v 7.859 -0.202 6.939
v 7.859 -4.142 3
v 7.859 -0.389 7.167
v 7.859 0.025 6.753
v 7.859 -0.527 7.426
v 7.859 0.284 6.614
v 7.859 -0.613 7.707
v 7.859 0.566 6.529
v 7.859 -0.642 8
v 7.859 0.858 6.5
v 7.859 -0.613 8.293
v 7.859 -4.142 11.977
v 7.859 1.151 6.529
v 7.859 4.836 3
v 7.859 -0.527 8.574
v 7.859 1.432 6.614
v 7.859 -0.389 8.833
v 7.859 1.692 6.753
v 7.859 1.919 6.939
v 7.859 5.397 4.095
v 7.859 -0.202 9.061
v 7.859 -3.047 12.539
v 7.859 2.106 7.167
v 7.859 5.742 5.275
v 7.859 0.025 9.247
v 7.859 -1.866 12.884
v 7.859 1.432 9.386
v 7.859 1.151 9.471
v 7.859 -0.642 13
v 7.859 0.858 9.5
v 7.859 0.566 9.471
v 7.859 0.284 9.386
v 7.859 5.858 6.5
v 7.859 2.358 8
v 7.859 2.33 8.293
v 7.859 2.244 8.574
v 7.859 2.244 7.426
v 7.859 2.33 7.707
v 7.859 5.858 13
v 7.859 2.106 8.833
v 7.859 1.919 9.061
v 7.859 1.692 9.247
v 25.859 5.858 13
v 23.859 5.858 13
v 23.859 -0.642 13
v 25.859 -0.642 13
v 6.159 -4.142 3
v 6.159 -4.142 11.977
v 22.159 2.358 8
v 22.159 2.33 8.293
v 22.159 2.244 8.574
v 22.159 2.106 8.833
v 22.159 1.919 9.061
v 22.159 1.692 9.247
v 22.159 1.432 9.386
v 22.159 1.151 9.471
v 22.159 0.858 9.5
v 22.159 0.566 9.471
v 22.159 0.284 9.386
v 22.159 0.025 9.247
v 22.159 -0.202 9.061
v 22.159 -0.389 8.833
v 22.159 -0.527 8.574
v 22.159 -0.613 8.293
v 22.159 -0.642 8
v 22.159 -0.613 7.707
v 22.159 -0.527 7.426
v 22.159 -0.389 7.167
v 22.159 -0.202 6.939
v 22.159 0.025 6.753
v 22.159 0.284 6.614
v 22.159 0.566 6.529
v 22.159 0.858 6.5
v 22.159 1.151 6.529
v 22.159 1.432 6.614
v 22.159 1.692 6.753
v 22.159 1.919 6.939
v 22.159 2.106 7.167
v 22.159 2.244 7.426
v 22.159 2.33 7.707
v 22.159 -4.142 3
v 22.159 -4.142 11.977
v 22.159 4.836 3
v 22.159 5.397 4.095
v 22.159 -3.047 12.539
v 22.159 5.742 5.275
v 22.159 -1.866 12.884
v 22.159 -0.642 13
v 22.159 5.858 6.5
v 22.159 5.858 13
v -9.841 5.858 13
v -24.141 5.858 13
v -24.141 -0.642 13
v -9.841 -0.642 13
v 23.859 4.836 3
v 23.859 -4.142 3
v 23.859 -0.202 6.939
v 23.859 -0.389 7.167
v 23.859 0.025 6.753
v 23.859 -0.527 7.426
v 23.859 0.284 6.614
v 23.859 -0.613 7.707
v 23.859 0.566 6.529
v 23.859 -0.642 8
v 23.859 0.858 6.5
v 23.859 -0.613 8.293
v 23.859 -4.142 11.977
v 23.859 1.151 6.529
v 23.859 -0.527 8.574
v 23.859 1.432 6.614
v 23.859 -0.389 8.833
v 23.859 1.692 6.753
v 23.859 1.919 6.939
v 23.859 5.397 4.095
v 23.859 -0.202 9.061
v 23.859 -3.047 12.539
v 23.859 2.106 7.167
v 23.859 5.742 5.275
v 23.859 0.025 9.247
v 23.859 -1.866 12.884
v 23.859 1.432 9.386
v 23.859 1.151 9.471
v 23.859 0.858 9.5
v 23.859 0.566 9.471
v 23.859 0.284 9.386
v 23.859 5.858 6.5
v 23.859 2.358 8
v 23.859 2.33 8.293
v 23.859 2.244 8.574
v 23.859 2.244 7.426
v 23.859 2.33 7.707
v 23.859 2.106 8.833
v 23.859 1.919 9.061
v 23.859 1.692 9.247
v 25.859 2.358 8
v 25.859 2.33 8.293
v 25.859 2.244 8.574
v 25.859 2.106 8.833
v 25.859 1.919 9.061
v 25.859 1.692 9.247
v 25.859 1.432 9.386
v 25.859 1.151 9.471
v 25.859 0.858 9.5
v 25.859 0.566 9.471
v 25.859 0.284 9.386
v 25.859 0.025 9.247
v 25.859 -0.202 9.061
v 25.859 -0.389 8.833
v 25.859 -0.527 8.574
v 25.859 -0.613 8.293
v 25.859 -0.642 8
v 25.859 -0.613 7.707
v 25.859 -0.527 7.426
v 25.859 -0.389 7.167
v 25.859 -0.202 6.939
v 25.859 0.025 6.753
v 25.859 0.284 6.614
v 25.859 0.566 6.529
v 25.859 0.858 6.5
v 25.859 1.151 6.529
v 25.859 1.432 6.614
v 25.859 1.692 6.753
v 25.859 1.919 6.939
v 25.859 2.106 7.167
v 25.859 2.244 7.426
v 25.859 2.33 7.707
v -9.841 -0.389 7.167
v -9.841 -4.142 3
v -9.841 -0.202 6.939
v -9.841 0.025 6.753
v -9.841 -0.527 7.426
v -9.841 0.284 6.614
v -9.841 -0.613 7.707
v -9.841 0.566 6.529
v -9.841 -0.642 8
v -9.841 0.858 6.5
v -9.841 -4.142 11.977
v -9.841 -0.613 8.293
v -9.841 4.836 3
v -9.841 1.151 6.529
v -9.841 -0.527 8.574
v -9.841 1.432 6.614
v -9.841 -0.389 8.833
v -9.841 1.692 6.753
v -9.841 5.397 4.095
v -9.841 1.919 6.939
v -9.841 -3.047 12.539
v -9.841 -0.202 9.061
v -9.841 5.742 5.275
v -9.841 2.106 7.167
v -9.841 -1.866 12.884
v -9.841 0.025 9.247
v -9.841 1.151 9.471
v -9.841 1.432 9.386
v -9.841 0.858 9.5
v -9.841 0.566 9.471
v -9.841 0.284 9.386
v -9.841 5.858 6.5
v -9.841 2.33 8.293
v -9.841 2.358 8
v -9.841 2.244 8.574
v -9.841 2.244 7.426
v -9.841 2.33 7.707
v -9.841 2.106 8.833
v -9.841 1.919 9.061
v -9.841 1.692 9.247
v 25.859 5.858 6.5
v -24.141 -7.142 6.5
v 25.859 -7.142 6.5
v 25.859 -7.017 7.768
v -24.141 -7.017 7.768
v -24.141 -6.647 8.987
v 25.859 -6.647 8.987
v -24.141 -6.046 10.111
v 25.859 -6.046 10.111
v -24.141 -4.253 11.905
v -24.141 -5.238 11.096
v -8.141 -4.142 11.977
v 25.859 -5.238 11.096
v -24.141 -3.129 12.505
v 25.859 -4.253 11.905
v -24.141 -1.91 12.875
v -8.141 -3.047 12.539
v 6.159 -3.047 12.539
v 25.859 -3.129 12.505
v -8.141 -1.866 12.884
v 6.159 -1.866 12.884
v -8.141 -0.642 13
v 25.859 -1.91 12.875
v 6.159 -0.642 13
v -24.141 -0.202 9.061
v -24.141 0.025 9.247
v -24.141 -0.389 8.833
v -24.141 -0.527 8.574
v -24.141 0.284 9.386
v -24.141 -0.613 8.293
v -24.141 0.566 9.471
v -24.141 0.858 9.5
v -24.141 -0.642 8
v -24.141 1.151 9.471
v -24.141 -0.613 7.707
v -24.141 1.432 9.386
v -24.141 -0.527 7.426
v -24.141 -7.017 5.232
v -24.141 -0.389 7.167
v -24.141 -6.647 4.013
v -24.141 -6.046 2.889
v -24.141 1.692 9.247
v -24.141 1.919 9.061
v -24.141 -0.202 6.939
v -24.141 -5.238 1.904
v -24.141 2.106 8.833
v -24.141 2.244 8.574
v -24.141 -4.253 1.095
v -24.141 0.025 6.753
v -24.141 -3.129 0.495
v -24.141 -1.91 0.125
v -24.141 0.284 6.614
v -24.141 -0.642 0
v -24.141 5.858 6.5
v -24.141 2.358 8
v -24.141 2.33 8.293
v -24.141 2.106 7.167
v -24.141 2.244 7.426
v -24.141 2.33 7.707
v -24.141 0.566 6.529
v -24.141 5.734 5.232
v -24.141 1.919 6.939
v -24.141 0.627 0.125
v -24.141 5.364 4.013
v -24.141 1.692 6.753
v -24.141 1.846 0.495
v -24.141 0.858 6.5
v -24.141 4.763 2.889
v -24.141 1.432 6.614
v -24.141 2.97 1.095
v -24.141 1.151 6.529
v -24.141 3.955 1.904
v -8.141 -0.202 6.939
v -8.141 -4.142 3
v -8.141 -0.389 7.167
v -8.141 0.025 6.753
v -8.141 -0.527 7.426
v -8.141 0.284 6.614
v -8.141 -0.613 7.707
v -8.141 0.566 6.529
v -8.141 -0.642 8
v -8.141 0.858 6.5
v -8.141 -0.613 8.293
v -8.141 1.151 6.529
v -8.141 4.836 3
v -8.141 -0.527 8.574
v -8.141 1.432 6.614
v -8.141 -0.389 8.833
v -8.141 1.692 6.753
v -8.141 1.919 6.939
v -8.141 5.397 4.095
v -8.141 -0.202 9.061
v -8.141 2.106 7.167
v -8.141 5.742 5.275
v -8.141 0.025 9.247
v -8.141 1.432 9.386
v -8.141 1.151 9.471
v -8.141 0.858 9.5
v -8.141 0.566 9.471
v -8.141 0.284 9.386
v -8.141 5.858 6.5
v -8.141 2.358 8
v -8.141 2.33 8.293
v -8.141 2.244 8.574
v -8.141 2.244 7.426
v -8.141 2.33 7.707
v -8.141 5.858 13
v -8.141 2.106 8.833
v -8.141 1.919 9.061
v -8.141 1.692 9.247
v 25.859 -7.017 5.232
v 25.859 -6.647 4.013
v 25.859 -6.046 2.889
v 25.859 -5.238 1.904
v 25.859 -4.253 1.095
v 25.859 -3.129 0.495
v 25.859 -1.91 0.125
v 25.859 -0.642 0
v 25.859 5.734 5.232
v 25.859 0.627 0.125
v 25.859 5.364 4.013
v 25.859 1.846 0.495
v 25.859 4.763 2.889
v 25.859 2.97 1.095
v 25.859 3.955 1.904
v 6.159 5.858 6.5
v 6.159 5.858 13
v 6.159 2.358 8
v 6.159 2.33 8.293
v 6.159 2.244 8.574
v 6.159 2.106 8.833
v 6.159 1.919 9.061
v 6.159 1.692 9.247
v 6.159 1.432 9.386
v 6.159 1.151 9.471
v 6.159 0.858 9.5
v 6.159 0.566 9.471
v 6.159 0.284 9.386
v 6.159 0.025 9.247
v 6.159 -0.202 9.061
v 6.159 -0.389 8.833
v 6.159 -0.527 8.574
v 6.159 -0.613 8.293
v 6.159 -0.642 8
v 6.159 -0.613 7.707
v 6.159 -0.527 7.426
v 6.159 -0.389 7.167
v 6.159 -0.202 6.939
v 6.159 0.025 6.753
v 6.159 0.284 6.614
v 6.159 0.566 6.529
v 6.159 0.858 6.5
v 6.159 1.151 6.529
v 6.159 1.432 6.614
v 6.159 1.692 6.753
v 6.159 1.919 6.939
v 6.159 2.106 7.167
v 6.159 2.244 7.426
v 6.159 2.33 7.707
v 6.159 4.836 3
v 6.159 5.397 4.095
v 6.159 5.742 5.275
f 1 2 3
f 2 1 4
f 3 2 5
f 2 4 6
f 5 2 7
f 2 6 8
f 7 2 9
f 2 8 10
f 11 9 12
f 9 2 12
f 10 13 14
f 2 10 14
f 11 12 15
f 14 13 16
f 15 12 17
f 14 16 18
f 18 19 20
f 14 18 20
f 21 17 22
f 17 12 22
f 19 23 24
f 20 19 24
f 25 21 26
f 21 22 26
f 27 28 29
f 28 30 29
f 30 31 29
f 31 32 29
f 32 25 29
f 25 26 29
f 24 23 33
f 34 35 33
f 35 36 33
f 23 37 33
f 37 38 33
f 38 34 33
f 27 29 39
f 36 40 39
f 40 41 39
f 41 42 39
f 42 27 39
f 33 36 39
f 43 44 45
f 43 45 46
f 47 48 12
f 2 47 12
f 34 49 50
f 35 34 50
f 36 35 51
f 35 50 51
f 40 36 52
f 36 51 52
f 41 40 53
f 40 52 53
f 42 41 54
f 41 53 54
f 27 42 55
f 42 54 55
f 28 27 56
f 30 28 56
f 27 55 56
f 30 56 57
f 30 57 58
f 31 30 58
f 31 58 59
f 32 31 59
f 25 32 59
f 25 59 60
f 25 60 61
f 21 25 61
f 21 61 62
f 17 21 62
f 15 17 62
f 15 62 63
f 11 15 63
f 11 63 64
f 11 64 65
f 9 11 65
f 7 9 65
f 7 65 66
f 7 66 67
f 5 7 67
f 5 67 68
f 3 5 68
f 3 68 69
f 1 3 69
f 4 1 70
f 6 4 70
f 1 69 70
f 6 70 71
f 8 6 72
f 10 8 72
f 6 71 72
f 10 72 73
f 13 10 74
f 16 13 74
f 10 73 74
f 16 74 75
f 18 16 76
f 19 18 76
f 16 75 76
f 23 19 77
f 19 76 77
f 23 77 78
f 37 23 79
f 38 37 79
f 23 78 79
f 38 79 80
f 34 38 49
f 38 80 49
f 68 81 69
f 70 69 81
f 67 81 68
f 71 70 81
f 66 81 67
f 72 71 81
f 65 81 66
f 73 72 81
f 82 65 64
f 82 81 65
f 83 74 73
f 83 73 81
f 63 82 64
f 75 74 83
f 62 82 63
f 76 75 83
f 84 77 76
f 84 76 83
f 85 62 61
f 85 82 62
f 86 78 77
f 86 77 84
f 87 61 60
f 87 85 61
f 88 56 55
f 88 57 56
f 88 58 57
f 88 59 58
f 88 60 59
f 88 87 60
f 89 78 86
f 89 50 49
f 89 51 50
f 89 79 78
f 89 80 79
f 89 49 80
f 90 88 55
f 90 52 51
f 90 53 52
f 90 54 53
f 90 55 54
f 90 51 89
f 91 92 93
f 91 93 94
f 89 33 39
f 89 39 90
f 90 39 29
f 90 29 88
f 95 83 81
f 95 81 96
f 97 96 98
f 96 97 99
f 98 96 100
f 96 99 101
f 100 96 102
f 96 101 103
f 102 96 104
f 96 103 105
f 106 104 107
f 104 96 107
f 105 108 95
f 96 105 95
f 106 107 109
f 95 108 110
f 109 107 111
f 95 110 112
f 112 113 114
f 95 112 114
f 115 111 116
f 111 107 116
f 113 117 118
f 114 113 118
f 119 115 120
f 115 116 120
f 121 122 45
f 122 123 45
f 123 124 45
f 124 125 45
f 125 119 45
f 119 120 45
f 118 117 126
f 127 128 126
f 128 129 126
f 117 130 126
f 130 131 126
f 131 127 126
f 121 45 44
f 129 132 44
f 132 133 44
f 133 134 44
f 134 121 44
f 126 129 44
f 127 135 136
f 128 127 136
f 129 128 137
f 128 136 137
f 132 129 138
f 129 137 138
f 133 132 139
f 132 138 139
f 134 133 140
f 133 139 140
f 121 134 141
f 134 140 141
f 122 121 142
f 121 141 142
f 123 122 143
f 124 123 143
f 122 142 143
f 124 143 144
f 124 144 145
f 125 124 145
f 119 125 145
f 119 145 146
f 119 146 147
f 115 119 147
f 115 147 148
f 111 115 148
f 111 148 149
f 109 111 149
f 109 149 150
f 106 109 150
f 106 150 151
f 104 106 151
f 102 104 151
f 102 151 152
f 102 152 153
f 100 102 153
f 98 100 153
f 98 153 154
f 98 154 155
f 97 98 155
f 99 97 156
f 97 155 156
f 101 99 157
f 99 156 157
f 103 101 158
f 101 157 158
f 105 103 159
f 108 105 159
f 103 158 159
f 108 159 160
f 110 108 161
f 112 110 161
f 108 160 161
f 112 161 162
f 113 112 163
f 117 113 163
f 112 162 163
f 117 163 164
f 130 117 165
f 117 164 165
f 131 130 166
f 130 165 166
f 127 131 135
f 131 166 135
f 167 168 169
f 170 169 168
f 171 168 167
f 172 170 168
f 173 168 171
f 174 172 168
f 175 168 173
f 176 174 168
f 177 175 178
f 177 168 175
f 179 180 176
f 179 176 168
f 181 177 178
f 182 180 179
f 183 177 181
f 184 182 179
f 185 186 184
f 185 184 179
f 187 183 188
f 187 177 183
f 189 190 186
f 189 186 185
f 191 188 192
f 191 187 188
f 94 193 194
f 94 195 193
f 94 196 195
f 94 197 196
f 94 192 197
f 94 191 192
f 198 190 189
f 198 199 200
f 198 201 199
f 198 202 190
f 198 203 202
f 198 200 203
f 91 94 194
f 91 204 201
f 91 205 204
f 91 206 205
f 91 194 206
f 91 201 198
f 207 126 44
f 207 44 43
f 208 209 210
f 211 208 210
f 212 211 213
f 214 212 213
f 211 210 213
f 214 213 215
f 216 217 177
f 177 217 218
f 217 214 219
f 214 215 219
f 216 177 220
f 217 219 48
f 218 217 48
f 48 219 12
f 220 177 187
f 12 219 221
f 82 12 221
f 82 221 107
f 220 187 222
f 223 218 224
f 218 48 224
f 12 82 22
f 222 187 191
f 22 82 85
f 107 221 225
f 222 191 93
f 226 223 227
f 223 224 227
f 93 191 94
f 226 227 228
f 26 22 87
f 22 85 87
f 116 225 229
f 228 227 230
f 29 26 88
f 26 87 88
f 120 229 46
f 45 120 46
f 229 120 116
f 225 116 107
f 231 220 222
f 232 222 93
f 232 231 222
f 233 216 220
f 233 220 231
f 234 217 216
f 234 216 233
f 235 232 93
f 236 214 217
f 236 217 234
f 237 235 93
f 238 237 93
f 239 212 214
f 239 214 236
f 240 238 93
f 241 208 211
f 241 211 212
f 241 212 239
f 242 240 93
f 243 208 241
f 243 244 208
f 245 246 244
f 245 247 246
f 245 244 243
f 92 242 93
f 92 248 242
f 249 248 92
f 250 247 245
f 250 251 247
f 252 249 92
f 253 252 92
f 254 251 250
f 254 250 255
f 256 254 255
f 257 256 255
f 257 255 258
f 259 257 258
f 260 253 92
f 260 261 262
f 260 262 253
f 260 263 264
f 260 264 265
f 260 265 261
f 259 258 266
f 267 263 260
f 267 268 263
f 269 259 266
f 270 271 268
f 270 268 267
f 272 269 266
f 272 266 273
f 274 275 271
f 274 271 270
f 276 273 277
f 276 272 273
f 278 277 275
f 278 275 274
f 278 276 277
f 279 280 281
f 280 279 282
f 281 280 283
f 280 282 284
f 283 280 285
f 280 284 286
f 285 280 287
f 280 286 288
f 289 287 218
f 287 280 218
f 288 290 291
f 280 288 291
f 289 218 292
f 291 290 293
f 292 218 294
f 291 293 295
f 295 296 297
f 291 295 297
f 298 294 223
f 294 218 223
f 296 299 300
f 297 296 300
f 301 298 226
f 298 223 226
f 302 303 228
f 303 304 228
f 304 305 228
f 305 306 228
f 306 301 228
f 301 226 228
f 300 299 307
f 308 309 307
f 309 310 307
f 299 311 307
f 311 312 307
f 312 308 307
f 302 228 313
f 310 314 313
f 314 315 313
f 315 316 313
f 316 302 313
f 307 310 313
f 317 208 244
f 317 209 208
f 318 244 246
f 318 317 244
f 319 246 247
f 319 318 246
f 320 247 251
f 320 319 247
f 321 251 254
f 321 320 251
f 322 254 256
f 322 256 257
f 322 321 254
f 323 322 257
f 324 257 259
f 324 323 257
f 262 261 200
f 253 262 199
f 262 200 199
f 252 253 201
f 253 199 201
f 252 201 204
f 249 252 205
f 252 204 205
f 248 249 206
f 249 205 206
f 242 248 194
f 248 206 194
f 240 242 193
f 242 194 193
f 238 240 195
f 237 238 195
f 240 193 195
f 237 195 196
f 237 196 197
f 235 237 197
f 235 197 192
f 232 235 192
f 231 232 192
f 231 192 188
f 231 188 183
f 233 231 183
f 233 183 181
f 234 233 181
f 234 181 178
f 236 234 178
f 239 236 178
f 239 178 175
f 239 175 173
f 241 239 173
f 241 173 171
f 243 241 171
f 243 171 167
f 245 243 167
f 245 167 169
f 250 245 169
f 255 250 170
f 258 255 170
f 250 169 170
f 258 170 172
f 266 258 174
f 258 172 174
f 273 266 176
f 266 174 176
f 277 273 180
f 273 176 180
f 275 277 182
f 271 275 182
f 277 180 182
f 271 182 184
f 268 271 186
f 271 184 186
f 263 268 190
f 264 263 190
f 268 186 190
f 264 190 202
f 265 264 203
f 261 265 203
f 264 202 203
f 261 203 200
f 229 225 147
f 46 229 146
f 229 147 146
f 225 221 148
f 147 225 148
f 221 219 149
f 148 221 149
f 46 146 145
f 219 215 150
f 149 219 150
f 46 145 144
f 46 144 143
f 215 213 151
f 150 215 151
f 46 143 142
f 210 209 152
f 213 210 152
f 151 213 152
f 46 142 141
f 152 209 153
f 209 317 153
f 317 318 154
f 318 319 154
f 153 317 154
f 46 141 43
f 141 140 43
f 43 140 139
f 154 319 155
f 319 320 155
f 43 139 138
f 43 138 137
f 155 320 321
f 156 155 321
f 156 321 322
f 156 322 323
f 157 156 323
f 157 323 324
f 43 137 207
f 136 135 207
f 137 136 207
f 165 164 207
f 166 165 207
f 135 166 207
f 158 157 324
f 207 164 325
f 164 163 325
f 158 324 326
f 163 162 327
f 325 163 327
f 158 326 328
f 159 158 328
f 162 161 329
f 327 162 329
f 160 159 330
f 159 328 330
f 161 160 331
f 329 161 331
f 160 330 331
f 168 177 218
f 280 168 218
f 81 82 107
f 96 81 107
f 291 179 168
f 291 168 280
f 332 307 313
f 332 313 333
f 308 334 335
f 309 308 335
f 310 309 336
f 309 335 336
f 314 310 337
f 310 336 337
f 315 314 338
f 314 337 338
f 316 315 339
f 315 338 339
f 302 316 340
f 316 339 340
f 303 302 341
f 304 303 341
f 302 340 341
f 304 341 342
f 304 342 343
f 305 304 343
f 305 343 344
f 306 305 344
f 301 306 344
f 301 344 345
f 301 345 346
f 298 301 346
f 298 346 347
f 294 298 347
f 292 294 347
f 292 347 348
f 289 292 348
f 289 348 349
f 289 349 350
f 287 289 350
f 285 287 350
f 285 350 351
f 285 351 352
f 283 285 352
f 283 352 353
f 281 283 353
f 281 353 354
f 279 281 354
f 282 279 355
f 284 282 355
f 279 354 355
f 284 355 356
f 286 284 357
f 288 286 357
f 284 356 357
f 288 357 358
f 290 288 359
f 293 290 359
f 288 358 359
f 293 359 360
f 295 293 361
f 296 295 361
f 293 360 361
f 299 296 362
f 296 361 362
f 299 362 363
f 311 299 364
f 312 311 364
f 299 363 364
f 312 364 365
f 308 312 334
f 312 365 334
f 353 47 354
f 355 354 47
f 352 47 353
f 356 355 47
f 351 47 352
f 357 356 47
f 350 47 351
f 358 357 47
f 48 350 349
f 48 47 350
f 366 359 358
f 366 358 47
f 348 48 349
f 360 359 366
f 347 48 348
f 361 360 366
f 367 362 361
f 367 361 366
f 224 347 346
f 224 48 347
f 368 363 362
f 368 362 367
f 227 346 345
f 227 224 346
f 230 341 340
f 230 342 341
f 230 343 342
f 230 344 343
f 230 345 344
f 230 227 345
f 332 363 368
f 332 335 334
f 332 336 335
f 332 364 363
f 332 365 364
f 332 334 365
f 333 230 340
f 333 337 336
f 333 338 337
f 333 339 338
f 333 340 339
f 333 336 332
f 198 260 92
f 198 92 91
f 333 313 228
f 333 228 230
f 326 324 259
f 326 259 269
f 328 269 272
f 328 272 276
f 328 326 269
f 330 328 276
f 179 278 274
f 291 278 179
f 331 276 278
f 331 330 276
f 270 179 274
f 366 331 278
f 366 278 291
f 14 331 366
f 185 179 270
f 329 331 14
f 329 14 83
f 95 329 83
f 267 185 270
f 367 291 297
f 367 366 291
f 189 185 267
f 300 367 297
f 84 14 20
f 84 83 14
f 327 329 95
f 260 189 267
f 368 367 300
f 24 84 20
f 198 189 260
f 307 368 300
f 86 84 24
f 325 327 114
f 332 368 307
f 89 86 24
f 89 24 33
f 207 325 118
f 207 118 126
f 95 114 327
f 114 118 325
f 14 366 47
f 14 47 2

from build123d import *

# Parameters (mm, degrees)
F0_W     = 50
F0_H     = 13
F1_DEPTH = 13
F2_R     = 1.5
F3_DEPTH = 50.001
F4_R     = 6.49999
F5_W     = 1.7
F5_H     = 10
F6_DEPTH = 10


# Not quite as in the source:
# - a fillet or chamfer is up to 0.001 mm smaller than in the source, because OpenCascade refuses the exact size
# - a feature names something its author has since deleted; it is built from what else it names


with BuildPart() as f1:
    # F0 (on Top) → F1 (new body)
    with BuildSketch(Plane.XY):
        with Locations((0.8589621633, -0.6415863931)):
            Rectangle(F0_W, F0_H)
    extrude(amount=F1_DEPTH)

    # F2 (on face) → F3 (cut, through all)
    with BuildSketch(Plane.YZ.offset(25.8589621633)):
        with Locations((0.8584136069, 8)):
            Circle(F2_R)
    extrude(amount=-F3_DEPTH, mode=Mode.SUBTRACT)

    # F4 (radius 6.5 in the source; OpenCascade refuses exactly that, so slightly less here)
    f4_edges = [f1.edges().sort_by_distance(p)[0] for p in [
        (0.858962, -7.141586, 13),
        (0.858962, -7.141586, 0),
        (0.858962, 5.858414, 0),
    ]]
    fillet(f4_edges, radius=F4_R)

    # F5 (on face) → F6 (cut)
    with BuildSketch(Plane.XY.offset(13)):
        with Locations((23.0089621633, 0.8584136069)):
            Rectangle(F5_W, F5_H)
        with Locations((7.0089621633, 0.8584136069)):
            Rectangle(F5_W, F5_H)
        with Locations((-8.9910378367, 0.8584136069)):
            Rectangle(F5_W, F5_H)
    extrude(amount=-F6_DEPTH, mode=Mode.SUBTRACT)


solid = f1.part
